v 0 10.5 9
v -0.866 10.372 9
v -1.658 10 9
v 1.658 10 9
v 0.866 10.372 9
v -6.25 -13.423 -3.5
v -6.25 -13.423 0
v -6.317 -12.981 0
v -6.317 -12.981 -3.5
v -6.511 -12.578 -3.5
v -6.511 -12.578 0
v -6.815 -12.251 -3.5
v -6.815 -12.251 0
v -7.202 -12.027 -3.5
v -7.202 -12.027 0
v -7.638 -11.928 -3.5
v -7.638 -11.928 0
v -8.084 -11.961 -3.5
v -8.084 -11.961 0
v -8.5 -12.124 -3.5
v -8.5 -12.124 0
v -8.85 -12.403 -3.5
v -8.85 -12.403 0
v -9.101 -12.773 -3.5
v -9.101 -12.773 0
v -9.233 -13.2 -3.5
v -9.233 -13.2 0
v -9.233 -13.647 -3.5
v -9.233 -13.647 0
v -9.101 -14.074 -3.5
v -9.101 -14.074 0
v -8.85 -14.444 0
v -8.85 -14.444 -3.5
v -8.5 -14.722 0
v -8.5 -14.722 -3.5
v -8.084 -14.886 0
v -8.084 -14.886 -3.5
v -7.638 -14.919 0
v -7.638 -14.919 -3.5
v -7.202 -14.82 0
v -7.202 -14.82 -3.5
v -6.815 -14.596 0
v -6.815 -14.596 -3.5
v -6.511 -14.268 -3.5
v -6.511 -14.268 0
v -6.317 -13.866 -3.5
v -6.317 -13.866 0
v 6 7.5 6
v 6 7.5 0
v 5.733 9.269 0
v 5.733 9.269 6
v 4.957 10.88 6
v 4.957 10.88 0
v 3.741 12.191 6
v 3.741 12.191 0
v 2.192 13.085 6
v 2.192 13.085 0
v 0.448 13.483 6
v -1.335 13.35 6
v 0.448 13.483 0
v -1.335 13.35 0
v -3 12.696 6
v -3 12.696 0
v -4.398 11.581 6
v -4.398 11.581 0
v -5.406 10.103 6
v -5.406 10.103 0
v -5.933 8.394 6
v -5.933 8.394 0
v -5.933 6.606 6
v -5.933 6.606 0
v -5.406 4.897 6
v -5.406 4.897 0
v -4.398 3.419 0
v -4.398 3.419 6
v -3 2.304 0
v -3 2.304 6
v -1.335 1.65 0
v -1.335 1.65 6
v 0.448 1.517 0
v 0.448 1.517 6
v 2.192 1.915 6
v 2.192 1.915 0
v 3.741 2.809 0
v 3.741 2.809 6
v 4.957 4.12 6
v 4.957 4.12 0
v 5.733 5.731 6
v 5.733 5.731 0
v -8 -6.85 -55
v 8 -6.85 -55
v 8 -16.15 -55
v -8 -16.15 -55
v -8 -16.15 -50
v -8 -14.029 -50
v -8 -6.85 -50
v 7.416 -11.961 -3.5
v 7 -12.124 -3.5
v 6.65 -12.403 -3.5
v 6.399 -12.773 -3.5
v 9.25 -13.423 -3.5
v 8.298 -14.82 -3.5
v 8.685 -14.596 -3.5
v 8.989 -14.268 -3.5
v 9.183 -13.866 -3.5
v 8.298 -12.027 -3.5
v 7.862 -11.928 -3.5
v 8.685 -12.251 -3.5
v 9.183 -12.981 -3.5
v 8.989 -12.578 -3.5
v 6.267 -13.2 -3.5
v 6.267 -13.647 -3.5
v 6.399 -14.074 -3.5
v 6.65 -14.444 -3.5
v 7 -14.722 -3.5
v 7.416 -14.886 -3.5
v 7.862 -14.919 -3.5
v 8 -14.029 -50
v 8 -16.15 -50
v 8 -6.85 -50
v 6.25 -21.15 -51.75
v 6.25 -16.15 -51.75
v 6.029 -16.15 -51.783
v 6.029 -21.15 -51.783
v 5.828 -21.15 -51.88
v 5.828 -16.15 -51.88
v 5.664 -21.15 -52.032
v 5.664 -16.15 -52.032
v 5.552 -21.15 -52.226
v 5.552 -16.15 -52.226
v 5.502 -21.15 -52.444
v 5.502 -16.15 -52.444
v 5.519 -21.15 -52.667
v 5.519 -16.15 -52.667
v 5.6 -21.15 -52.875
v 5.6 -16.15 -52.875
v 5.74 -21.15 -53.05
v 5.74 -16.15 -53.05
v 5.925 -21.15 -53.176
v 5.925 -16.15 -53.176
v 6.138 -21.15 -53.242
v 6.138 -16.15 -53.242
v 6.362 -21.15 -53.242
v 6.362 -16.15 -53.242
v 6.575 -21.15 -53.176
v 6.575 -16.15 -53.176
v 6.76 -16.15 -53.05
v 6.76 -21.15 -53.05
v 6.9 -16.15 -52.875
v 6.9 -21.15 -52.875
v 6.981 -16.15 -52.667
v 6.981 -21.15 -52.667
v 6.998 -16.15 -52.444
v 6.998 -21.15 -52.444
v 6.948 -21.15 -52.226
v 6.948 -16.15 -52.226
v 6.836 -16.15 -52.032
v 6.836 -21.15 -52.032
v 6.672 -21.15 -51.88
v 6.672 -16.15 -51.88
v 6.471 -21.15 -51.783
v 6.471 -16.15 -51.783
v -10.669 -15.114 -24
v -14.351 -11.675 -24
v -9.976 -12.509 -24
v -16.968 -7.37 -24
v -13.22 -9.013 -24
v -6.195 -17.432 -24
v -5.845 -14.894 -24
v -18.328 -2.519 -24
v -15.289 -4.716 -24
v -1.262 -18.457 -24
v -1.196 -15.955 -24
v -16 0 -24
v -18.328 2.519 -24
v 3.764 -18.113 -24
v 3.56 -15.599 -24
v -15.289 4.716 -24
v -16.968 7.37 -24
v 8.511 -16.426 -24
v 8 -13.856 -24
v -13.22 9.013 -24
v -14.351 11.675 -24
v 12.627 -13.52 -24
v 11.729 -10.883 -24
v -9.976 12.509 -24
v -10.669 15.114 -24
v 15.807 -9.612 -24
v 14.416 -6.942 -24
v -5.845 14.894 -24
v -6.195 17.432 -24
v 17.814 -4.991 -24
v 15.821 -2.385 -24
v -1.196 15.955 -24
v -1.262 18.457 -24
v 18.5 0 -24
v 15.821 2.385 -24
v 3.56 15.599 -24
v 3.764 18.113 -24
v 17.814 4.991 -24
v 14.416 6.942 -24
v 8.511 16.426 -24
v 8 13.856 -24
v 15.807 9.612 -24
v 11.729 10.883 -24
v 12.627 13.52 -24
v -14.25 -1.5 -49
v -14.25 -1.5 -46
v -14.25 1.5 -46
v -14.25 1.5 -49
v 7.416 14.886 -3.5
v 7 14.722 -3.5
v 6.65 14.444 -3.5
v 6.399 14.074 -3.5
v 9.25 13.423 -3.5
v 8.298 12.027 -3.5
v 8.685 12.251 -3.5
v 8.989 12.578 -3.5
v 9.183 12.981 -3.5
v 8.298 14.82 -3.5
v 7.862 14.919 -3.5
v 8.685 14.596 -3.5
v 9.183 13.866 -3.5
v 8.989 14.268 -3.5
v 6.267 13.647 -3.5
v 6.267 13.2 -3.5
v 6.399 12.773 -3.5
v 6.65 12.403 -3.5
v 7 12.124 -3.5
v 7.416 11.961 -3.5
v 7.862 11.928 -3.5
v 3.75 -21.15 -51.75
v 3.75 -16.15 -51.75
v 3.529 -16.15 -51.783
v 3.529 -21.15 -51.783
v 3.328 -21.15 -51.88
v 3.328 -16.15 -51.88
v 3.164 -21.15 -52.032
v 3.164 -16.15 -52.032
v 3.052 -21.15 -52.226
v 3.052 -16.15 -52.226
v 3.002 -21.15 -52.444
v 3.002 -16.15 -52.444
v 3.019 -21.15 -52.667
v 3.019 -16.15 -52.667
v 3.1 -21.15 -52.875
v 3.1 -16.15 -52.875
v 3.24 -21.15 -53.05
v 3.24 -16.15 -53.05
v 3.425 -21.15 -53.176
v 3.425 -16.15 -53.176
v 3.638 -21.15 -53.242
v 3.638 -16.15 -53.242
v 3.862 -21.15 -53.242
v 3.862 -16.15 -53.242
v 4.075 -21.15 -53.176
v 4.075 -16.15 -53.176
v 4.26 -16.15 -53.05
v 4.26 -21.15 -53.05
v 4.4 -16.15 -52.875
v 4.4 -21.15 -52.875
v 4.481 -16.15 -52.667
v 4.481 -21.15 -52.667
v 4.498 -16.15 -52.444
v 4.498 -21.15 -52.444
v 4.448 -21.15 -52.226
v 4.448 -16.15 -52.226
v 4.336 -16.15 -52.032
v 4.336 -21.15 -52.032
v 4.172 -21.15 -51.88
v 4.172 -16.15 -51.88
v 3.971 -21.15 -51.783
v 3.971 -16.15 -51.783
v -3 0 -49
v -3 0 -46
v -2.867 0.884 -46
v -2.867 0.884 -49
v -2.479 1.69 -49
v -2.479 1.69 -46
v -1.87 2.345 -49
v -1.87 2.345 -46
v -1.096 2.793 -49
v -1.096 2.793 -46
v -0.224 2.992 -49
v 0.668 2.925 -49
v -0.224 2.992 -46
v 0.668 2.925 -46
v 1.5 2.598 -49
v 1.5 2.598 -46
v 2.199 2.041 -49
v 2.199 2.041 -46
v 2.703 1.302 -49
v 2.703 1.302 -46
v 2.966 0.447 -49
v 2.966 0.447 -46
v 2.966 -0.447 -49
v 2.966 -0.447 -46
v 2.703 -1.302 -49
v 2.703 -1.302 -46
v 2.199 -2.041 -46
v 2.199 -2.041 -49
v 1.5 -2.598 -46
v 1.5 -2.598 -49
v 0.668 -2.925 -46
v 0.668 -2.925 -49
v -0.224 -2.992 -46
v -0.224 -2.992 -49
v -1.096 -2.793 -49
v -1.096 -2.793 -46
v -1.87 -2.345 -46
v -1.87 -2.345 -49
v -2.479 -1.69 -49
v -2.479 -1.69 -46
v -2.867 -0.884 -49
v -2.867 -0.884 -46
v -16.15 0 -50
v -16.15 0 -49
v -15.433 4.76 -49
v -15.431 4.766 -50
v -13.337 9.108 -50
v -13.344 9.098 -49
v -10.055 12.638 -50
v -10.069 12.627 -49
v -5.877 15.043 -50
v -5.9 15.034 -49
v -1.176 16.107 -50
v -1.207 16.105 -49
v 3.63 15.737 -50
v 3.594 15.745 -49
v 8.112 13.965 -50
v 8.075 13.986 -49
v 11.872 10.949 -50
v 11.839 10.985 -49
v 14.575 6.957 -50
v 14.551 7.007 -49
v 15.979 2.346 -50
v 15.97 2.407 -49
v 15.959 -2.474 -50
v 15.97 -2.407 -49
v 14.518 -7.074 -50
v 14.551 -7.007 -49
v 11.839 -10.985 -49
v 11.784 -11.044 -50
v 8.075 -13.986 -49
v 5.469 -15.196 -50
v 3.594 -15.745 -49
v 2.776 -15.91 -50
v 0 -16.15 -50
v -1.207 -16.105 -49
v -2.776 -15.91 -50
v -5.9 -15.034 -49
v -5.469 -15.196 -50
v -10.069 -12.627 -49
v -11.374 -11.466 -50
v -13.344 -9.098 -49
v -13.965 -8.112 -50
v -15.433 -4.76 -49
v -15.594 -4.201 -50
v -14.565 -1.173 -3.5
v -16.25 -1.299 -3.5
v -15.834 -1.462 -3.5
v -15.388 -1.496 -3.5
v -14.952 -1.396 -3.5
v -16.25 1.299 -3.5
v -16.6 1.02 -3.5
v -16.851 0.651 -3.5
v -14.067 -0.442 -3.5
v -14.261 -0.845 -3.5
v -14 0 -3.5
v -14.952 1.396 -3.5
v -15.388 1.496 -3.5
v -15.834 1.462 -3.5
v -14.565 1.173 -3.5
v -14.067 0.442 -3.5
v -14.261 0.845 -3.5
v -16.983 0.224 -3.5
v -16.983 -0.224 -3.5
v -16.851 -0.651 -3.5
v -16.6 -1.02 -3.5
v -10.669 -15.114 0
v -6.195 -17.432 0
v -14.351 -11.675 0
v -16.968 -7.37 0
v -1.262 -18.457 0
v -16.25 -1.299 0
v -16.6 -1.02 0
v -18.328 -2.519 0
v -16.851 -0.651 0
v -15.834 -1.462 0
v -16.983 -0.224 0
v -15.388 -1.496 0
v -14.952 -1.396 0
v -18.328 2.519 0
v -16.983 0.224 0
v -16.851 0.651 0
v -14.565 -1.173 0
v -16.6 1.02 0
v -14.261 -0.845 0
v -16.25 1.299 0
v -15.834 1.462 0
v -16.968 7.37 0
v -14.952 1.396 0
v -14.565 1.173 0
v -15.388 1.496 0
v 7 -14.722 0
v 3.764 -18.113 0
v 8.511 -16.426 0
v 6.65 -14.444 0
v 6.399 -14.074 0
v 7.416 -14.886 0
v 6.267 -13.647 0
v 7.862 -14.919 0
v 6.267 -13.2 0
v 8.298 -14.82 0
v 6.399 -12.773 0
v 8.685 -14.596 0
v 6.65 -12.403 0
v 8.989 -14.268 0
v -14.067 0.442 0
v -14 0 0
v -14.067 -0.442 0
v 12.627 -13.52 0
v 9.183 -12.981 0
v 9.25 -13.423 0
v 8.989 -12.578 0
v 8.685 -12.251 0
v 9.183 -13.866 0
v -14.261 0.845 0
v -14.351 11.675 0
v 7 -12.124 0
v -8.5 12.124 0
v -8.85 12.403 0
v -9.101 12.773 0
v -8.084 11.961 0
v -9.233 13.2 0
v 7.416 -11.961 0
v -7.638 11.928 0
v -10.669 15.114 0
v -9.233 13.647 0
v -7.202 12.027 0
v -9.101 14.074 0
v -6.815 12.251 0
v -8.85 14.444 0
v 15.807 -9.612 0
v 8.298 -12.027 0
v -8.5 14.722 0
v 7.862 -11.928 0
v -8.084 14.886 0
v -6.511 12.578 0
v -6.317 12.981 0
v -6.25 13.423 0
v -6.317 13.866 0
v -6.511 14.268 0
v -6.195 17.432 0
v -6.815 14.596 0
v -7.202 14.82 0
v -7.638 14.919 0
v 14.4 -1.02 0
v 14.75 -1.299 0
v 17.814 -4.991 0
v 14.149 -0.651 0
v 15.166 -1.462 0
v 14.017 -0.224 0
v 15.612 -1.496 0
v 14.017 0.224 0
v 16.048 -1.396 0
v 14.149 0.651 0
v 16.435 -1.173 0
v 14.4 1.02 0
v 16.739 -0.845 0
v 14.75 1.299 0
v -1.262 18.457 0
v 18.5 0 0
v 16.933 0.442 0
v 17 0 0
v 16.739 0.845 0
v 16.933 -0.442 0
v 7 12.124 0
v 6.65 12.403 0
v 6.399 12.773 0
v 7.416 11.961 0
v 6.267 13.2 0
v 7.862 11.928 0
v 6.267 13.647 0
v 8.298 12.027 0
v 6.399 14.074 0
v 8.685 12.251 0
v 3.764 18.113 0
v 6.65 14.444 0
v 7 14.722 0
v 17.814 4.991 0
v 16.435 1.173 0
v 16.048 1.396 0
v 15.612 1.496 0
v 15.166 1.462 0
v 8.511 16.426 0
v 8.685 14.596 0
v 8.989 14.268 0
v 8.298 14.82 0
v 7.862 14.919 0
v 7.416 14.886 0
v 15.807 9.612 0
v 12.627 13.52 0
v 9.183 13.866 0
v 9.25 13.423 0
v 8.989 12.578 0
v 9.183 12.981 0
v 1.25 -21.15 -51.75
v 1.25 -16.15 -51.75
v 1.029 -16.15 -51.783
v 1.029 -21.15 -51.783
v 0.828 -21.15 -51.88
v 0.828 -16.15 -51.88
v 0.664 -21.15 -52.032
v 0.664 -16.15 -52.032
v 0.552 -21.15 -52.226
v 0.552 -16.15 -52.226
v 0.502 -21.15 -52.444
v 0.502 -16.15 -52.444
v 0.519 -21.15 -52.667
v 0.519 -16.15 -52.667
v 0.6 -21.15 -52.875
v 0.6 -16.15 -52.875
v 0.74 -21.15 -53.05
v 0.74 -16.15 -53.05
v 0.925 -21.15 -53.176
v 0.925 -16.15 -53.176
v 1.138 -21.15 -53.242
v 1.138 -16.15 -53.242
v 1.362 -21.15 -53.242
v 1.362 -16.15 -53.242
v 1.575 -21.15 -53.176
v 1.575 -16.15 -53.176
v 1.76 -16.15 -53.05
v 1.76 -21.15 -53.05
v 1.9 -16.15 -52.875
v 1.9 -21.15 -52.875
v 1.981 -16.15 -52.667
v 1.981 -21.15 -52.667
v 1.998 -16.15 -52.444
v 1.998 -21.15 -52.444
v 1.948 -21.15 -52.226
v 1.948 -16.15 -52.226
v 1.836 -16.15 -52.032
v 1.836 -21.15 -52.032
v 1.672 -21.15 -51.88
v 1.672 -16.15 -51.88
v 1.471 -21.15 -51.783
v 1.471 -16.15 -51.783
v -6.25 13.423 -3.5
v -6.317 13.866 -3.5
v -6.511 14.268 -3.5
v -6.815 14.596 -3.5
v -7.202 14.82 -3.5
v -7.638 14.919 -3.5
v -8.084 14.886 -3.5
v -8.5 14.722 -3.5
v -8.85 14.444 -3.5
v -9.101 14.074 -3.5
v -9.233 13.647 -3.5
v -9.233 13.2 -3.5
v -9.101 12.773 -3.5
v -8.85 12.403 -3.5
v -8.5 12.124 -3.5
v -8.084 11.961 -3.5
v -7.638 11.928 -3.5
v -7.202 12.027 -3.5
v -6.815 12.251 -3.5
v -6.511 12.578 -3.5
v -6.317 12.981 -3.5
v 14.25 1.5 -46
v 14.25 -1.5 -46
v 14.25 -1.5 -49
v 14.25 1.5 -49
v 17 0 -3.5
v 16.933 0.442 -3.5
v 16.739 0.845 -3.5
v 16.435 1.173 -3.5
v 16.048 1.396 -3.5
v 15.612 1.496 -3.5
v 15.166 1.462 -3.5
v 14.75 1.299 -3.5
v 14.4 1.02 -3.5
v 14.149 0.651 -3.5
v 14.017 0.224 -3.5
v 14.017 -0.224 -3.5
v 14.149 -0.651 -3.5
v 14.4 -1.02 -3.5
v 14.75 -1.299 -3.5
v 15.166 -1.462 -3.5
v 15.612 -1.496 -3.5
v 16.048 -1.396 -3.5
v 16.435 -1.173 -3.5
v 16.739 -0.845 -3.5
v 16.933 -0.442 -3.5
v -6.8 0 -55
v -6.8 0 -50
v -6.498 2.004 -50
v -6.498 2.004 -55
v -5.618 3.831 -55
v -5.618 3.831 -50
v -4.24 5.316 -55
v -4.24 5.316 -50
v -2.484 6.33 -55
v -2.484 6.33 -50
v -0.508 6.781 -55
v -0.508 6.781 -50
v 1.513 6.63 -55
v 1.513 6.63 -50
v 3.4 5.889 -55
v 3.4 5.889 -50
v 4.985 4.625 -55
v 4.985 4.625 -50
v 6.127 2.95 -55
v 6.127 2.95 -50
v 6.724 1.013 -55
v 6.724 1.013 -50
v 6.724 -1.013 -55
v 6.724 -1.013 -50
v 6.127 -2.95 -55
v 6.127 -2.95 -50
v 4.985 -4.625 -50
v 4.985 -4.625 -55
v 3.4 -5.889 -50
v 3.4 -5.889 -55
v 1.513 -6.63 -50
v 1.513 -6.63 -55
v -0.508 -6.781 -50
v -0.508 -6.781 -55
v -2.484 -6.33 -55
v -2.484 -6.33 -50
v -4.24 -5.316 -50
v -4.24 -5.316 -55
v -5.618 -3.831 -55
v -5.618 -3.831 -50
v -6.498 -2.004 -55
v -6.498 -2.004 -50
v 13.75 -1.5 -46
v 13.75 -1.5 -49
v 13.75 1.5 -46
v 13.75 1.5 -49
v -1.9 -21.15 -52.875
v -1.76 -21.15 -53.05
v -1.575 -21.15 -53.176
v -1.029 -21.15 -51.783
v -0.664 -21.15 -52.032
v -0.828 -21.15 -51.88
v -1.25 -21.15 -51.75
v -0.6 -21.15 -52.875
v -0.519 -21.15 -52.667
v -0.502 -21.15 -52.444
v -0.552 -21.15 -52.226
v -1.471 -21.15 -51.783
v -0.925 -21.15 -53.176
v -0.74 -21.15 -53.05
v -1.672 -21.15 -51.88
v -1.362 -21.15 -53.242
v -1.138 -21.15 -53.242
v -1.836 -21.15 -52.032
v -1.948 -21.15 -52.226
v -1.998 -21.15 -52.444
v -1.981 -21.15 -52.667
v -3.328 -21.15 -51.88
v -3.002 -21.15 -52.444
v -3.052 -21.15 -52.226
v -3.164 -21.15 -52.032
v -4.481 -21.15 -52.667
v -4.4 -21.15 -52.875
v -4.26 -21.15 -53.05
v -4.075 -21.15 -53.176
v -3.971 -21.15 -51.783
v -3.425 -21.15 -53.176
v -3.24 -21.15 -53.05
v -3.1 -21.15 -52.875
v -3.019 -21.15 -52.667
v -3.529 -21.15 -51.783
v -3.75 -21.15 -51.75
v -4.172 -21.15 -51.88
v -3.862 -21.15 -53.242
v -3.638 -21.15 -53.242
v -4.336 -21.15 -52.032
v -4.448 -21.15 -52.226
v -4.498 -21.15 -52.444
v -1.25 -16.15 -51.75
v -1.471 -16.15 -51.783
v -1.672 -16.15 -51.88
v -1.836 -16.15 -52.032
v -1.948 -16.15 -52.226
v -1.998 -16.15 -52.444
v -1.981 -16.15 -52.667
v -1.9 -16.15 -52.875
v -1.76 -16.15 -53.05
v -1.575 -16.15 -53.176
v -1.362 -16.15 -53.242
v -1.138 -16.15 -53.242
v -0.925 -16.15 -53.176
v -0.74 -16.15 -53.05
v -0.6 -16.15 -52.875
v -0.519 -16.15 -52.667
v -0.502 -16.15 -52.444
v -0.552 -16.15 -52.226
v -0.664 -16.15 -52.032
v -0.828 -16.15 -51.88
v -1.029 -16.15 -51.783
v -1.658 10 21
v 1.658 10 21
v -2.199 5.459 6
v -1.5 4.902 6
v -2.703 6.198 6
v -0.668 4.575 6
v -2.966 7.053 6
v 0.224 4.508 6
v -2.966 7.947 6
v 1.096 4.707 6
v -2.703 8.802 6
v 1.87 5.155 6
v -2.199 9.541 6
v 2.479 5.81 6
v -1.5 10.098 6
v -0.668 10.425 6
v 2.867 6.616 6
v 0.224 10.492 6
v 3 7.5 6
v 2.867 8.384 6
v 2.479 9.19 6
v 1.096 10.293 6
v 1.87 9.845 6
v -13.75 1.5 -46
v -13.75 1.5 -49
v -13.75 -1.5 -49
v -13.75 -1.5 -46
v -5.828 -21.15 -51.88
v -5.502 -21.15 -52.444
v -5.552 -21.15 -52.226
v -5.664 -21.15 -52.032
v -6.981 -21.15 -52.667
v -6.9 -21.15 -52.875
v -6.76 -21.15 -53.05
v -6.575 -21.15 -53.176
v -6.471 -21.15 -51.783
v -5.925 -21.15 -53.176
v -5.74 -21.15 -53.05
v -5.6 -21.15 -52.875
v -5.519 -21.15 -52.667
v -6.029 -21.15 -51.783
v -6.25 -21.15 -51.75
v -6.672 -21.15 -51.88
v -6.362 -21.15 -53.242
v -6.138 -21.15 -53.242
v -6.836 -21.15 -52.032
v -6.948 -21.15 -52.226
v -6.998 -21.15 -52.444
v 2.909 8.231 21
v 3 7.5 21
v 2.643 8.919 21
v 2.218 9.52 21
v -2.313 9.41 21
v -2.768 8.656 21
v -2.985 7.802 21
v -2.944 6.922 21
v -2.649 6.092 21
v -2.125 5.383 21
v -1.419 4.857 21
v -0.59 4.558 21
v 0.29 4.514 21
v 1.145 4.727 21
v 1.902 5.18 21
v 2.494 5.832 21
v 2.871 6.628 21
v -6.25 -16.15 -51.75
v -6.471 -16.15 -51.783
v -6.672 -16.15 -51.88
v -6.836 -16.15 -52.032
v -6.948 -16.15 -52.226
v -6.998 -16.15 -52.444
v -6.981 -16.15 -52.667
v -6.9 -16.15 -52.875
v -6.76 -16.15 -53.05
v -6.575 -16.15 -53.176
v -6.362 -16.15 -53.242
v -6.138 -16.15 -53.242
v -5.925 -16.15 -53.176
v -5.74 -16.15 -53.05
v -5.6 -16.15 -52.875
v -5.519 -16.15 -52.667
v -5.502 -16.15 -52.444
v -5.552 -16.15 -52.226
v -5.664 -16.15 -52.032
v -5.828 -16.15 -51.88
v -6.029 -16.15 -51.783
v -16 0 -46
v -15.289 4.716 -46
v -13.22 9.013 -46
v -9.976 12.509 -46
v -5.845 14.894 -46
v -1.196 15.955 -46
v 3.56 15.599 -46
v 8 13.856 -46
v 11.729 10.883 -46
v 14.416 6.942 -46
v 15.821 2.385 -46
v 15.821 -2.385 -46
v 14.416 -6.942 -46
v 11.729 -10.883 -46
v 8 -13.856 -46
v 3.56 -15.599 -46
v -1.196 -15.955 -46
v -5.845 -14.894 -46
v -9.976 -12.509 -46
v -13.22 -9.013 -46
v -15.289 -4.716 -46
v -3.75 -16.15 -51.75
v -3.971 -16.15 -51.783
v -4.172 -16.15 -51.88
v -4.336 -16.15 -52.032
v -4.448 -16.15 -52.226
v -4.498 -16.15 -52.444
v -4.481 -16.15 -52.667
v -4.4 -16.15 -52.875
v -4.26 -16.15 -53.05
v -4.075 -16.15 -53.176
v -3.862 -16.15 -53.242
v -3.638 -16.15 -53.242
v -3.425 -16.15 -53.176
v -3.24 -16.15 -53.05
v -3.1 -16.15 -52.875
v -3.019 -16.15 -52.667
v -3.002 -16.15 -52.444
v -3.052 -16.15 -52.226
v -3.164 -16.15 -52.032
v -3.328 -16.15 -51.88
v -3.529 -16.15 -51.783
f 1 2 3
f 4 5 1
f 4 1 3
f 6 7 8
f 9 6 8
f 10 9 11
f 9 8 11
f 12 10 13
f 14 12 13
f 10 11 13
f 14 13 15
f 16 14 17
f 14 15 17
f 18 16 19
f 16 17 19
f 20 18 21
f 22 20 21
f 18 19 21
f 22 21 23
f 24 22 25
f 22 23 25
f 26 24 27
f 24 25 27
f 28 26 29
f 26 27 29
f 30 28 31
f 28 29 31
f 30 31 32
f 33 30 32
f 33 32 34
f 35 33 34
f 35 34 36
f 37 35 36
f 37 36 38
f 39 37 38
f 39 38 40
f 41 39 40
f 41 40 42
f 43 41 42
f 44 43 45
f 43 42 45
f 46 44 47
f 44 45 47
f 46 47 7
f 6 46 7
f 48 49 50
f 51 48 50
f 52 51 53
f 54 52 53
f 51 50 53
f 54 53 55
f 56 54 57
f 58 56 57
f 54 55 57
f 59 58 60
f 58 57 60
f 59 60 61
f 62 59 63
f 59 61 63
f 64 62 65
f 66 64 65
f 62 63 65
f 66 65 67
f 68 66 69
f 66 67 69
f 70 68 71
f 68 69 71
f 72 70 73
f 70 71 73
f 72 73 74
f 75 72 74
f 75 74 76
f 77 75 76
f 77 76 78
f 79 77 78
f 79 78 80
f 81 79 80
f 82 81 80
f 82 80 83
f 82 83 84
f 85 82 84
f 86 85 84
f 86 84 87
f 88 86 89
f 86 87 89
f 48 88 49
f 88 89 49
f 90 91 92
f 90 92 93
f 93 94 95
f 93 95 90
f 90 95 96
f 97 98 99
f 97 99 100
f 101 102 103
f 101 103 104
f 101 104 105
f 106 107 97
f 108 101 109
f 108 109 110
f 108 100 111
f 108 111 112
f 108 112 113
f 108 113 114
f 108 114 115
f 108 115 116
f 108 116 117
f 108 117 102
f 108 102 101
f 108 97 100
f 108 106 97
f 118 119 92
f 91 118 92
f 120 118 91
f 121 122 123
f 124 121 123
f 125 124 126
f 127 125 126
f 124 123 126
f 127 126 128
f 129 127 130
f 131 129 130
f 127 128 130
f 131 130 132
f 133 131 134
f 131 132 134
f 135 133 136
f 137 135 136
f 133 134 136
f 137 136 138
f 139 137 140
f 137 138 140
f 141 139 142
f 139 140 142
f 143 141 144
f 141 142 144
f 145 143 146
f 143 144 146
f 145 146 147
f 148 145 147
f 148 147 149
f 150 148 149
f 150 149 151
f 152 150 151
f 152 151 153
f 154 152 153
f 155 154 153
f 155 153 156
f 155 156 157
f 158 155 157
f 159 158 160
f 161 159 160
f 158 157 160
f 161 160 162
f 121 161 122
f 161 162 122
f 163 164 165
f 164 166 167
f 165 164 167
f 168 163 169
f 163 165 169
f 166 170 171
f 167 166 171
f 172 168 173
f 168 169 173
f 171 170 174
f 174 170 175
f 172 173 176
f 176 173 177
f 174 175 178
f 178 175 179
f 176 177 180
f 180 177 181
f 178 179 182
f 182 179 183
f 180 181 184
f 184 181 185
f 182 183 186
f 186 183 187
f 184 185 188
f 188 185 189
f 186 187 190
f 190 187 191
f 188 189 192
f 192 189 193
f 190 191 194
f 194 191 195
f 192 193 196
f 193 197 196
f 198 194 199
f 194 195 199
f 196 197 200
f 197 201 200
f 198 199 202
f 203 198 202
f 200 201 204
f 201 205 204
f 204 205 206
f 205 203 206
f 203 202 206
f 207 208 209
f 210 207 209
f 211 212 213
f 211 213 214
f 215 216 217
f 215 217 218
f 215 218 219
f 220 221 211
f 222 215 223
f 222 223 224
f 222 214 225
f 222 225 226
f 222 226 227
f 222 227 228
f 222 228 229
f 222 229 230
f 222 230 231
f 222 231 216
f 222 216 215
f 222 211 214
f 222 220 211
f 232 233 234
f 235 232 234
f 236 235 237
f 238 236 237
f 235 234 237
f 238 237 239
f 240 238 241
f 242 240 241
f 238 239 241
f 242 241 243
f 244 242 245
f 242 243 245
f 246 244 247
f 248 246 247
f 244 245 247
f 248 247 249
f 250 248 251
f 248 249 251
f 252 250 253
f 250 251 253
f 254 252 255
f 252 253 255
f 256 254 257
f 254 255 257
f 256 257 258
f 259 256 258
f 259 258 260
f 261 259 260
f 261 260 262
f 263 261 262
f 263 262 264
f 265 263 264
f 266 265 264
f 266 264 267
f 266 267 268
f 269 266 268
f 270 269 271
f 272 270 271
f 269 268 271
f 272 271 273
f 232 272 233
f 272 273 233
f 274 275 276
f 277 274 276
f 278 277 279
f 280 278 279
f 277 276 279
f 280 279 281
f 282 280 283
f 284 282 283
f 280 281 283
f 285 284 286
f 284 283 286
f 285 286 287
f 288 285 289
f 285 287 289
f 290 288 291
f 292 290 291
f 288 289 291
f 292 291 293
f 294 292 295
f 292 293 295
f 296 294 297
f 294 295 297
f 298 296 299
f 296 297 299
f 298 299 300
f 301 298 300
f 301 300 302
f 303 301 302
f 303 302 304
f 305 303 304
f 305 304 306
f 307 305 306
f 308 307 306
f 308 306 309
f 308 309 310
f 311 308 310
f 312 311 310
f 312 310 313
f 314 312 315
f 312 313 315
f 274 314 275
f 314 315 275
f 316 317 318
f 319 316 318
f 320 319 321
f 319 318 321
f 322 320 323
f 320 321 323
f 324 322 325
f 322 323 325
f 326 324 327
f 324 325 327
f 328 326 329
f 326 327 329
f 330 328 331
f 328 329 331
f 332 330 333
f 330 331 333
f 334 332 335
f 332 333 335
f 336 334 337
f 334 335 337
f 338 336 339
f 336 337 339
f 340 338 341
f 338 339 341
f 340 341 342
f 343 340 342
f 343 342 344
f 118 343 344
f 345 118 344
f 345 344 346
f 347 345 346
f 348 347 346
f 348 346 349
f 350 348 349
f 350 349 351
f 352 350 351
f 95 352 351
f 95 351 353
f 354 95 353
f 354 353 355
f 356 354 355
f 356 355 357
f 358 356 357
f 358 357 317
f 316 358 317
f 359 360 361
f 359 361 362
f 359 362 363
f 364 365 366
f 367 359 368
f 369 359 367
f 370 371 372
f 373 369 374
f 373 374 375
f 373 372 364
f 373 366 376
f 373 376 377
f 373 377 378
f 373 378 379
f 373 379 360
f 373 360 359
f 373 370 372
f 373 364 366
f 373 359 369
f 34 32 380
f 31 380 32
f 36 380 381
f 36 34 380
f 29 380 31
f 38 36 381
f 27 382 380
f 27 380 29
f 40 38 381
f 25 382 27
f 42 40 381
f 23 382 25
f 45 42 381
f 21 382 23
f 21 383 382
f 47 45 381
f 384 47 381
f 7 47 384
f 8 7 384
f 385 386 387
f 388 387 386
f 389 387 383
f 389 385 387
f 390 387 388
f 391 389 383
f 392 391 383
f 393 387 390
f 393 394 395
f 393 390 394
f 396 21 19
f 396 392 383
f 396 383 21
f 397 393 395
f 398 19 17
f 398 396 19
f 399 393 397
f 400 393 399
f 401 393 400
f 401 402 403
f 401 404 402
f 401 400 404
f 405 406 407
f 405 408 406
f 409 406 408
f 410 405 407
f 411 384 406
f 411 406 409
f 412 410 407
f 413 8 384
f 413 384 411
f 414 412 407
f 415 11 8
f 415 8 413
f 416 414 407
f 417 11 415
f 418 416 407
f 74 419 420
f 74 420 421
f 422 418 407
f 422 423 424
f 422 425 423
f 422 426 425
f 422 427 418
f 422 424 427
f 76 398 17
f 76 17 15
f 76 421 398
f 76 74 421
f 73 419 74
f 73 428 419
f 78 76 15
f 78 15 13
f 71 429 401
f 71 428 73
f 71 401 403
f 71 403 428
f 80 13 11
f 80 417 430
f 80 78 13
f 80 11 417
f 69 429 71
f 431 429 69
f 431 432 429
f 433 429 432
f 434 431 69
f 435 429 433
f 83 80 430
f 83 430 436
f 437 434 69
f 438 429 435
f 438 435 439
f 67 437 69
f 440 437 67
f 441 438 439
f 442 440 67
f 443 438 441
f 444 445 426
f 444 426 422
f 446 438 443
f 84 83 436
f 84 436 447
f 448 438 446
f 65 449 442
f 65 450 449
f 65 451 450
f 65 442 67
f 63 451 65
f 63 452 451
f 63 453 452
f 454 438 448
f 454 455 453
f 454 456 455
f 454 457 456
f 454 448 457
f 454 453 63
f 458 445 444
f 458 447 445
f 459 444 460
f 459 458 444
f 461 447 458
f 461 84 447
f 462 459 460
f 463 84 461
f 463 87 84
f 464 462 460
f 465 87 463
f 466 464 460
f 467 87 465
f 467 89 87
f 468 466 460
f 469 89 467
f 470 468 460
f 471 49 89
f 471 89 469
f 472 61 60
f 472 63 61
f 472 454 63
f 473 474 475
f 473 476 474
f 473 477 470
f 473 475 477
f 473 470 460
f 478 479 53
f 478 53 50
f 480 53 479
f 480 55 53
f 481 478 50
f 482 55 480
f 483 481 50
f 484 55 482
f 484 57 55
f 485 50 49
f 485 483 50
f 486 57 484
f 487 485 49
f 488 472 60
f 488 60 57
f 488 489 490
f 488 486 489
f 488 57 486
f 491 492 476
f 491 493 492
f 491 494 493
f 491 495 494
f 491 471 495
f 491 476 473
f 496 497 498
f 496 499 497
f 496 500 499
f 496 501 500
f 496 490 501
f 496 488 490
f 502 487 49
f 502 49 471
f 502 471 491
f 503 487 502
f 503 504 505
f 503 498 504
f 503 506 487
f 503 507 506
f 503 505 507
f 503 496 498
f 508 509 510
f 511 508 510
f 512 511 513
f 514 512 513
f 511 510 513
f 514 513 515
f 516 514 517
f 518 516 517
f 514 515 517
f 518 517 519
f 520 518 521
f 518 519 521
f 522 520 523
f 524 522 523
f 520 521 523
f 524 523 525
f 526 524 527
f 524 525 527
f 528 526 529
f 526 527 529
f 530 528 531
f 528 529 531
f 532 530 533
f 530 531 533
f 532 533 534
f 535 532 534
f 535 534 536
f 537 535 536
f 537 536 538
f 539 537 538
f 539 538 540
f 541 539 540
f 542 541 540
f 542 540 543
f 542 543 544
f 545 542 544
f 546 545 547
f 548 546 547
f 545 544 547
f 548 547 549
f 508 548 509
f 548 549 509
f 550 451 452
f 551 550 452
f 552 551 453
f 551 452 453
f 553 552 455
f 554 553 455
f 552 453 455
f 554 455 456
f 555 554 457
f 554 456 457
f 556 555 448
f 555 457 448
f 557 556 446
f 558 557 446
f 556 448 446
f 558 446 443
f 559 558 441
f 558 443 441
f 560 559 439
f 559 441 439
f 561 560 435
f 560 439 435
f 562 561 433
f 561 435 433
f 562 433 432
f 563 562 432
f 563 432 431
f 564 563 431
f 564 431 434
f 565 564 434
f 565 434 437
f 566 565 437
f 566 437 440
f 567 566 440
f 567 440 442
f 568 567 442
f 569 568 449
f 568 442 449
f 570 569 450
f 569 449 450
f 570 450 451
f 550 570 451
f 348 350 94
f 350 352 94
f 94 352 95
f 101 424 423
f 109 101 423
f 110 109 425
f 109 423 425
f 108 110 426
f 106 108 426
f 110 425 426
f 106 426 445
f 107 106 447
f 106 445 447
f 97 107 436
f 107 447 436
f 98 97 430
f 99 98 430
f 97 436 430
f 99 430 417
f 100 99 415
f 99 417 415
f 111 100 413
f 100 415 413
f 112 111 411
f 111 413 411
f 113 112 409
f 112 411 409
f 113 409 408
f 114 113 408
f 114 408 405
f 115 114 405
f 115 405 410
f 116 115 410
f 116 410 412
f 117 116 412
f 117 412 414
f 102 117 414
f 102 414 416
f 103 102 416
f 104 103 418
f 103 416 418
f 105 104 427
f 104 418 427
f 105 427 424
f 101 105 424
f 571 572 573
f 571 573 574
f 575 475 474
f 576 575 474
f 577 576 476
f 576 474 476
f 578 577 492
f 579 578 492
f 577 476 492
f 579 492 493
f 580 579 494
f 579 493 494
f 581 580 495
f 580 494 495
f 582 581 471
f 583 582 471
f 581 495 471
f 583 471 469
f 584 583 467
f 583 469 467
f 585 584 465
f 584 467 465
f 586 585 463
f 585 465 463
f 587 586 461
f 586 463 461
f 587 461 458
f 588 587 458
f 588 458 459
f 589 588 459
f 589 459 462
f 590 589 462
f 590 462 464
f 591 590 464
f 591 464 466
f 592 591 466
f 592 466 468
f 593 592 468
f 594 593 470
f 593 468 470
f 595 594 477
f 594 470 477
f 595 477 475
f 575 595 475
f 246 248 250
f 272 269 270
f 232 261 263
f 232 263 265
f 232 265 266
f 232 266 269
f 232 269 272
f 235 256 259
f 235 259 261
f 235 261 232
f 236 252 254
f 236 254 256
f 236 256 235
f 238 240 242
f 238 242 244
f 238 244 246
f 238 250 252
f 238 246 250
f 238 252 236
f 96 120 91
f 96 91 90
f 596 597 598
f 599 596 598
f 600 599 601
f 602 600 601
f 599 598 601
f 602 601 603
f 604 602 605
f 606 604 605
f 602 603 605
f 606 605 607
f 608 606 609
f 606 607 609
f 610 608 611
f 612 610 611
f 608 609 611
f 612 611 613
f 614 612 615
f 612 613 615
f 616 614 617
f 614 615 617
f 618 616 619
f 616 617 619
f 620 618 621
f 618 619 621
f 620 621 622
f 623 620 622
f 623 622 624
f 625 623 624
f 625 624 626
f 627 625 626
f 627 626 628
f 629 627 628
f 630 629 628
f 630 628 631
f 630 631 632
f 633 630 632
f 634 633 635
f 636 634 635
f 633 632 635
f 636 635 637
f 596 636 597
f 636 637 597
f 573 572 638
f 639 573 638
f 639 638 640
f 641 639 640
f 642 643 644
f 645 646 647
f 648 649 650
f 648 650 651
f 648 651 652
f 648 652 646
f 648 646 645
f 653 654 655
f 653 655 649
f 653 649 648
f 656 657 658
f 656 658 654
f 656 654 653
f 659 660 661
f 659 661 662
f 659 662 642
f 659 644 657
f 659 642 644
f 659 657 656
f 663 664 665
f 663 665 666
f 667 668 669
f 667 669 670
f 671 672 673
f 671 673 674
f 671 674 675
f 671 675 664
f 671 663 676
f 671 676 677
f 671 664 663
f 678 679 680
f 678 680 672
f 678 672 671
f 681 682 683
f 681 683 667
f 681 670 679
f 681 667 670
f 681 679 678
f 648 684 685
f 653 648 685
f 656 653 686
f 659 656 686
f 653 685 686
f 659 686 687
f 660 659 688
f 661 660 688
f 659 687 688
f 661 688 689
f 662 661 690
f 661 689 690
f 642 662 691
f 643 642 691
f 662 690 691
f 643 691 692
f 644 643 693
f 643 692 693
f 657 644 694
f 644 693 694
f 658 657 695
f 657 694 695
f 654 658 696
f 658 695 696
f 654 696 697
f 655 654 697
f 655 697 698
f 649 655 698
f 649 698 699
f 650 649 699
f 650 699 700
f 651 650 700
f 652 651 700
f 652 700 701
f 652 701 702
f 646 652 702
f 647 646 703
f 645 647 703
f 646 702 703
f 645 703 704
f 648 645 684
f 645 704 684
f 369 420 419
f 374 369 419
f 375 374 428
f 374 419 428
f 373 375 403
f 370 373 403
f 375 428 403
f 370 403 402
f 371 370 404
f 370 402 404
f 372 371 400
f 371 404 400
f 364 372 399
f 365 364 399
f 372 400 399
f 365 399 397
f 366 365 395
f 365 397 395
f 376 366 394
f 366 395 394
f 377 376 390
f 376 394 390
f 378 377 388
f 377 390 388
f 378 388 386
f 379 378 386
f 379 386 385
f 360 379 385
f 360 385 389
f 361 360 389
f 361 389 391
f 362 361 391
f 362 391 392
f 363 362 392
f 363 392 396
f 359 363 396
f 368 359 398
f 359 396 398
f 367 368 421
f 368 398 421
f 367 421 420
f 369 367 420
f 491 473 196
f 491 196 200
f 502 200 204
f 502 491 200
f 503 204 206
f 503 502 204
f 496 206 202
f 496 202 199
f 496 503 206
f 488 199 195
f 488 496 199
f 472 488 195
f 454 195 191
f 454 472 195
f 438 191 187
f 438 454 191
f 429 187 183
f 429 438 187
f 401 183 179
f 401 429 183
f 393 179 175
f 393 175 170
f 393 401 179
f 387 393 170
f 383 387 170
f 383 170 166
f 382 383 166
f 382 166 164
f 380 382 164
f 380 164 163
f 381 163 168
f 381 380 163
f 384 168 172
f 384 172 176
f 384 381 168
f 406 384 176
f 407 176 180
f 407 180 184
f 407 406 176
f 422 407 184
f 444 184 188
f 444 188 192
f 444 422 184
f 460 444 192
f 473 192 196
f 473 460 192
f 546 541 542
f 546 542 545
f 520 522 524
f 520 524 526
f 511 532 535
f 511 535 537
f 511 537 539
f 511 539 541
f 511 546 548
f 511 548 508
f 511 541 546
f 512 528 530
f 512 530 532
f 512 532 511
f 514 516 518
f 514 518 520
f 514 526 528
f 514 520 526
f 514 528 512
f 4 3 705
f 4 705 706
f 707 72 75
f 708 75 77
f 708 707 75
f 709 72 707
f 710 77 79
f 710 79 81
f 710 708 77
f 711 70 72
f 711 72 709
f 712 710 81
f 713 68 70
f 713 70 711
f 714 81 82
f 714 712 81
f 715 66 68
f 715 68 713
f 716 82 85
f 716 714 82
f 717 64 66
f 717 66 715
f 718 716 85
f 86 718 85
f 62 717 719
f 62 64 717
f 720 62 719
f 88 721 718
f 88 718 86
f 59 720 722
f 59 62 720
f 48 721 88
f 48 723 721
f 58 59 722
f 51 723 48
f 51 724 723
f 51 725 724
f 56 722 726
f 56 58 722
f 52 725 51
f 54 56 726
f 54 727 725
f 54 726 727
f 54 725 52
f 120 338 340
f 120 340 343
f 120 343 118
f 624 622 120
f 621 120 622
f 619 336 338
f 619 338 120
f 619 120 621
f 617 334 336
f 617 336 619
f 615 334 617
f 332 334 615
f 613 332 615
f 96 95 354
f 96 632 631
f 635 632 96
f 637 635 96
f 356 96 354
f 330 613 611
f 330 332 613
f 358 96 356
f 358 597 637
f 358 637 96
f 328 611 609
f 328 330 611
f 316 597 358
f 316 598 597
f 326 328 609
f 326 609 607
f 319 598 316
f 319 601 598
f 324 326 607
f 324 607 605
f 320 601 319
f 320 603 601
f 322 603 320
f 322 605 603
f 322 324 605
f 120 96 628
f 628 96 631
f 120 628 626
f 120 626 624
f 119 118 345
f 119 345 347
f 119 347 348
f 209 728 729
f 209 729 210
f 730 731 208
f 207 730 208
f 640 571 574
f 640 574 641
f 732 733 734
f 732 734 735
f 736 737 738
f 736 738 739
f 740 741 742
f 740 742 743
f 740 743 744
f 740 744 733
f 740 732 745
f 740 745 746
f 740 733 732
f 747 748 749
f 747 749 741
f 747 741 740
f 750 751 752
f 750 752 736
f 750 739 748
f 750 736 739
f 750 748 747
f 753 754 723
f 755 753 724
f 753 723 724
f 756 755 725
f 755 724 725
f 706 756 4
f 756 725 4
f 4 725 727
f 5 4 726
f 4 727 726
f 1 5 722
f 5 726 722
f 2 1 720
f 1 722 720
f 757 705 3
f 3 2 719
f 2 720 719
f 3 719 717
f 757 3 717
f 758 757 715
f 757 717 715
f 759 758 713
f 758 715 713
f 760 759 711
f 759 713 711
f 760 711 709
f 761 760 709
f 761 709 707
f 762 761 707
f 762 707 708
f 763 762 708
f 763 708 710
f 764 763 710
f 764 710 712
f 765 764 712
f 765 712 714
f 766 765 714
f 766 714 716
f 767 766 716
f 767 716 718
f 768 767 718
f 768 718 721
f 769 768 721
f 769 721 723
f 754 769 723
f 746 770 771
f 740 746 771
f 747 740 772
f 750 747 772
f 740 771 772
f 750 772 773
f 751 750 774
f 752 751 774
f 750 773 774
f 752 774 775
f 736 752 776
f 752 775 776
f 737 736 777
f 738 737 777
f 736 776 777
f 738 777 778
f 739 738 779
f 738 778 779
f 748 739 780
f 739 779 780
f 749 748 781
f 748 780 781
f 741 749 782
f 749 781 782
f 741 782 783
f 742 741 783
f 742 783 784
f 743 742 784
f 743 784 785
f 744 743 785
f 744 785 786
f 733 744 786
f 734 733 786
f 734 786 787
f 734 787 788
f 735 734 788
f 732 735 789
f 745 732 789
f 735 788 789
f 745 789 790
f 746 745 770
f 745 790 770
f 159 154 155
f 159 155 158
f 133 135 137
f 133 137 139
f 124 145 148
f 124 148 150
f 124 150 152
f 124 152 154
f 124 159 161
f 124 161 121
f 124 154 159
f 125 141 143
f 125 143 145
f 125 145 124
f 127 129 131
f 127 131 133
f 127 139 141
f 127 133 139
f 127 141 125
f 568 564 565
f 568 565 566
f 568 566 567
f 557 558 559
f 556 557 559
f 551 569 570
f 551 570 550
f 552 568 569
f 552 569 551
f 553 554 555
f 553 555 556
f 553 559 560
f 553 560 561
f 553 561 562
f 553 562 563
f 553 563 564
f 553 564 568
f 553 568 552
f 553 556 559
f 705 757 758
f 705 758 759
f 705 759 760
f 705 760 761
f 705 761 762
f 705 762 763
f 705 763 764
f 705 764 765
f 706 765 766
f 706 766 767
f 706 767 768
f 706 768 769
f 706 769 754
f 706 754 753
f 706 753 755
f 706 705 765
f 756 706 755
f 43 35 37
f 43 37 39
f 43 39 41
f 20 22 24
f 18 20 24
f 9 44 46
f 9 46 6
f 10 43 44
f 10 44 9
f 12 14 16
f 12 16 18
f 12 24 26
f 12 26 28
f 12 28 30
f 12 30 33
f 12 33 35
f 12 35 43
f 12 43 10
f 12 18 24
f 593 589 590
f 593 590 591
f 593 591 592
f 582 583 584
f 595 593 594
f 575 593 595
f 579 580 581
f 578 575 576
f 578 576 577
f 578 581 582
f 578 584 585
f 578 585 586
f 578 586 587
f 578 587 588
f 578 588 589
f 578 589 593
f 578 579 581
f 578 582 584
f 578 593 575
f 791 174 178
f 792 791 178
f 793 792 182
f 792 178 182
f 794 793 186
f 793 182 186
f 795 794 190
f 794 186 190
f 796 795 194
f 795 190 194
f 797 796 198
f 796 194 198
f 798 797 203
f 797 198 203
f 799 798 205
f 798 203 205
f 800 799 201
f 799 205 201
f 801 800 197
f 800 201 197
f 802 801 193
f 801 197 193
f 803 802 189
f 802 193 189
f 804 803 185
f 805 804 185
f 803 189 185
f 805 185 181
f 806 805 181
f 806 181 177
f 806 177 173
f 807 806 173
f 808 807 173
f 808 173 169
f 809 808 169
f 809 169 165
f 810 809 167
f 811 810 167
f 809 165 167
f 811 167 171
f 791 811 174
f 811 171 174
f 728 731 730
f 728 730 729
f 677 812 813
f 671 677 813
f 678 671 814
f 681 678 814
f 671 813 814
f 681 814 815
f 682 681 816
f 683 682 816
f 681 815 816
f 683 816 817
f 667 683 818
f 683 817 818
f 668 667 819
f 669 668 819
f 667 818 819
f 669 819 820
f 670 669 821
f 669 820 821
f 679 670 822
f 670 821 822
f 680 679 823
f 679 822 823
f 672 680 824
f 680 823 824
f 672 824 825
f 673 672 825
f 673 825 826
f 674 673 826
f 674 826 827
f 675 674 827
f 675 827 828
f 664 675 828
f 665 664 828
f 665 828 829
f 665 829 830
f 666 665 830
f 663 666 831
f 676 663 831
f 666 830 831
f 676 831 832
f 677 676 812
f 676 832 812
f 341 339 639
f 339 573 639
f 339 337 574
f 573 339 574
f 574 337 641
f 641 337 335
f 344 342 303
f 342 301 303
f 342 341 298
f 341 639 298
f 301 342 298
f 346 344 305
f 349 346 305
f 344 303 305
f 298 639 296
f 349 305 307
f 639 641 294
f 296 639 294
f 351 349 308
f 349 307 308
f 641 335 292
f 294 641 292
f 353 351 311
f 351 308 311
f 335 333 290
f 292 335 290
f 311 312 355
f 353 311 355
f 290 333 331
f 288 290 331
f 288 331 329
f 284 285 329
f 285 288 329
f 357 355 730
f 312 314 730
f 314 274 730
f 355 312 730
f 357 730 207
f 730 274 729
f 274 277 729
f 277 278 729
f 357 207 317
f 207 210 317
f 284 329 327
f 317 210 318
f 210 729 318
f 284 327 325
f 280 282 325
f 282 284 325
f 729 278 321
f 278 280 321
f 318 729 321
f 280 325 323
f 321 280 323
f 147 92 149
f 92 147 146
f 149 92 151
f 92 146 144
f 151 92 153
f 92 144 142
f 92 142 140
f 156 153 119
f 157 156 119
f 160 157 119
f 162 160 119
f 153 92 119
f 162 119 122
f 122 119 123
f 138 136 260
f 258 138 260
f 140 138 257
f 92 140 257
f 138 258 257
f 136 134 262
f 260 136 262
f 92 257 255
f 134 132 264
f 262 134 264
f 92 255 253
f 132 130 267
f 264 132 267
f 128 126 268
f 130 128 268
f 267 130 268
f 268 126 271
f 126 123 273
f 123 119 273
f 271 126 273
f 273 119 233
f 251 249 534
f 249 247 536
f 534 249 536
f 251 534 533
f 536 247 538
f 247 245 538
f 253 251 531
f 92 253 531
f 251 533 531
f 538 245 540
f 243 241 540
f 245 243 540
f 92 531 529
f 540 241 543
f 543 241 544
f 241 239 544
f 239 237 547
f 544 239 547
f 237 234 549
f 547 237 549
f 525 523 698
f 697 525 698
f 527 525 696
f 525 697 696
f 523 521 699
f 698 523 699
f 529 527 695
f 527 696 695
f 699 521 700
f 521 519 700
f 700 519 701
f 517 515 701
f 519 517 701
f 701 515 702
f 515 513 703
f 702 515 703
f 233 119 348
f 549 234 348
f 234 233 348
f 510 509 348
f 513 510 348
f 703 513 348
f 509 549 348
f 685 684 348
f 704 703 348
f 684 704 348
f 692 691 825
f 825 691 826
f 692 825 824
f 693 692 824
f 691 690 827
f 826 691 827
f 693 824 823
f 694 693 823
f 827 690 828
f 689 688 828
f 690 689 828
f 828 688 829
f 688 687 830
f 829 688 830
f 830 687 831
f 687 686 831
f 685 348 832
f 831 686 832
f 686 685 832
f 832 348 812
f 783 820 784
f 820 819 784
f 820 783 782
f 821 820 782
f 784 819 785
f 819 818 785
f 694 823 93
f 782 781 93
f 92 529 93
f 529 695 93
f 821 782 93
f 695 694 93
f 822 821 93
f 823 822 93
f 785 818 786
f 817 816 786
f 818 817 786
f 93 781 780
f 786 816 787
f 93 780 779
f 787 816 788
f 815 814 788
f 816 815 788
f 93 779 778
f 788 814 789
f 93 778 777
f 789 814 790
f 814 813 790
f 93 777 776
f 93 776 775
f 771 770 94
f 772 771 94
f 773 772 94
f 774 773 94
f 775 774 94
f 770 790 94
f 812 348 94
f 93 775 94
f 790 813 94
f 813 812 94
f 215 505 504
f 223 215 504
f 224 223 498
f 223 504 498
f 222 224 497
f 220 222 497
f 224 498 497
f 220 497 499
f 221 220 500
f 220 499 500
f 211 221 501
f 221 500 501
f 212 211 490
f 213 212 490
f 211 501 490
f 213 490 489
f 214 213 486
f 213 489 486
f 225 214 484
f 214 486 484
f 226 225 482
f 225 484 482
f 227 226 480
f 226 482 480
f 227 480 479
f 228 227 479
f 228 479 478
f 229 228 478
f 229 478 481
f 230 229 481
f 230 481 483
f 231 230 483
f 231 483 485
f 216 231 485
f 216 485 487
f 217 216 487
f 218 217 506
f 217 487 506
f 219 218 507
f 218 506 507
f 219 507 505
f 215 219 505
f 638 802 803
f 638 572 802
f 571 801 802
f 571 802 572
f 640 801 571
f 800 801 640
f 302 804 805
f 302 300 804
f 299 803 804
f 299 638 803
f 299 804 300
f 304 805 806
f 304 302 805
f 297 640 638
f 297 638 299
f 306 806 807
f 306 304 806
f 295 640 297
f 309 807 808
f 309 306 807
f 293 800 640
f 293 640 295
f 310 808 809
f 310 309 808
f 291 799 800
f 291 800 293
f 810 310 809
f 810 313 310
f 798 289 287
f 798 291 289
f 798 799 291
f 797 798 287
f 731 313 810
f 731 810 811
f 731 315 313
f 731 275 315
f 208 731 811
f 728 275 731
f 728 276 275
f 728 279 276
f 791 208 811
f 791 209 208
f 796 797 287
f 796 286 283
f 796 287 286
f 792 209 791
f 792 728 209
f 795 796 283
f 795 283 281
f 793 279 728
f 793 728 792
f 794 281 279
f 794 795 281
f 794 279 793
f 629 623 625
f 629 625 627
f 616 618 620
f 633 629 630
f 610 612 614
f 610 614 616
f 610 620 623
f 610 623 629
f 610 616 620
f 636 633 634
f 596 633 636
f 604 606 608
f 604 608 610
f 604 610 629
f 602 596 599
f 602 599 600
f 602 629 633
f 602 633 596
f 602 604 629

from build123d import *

# Parameters (mm, degrees)
SKETCH_2_R          = 18.5
EXTRUDE_1_DEPTH     = 24
SKETCH_3_R          = 16
EXTRUDE_2_DEPTH     = 22
SKETCH_4_R          = 3
SKETCH_4_W          = 0.5
SKETCH_4_H          = 3
EXTRUDE_3_DEPTH     = 3
SKETCH_5_R          = 16.15
EXTRUDE_4_DEPTH     = 1
SKETCH_6_R          = 6.8
SKETCH_6_W          = 16
SKETCH_6_H          = 9.3
EXTRUDE_7_DEPTH     = 5
SKETCH_7_R          = 0.75
EXTRUDE_8_DEPTH     = 5
SKETCH_8_R          = 6
EXTRUDE_9_DEPTH     = 6
SKETCH_9_R          = 3
EXTRUDE_10_DEPTH    = 15
CUT_EXTRUDE_START   = -12
CUT_EXTRUDE_1_DEPTH = 12
SKETCH_11_R         = 1.5
CUT_EXTRUDE_2_DEPTH = 3.5


with BuildPart() as part:
    # 스케치2 → 보스-돌출1 (new body)
    with BuildSketch(Plane.XY):
        Circle(SKETCH_2_R)
    extrude(amount=-EXTRUDE_1_DEPTH)

    # 스케치3 → 보스-돌출2 (add)
    with BuildSketch(Plane(origin=(0, 0, -24), x_dir=(-1, 0, 0), z_dir=(0, 0, -1))):
        Circle(SKETCH_3_R)
    extrude(amount=EXTRUDE_2_DEPTH)

    # 스케치4 → 보스-돌출3 (add)
    with BuildSketch(Plane(origin=(0, 0, -46), x_dir=(-1, 0, 0), z_dir=(0, 0, -1))):
        Circle(SKETCH_4_R)
        with Locations((14, 0)):
            Rectangle(SKETCH_4_W, SKETCH_4_H)
        with Locations((-14, 0)):
            Rectangle(SKETCH_4_W, SKETCH_4_H)
    extrude(amount=EXTRUDE_3_DEPTH)

    # 스케치5 → 보스-돌출4 (add)
    with BuildSketch(Plane(origin=(0, 0, -49), x_dir=(-1, 0, 0), z_dir=(0, 0, -1))):
        Circle(SKETCH_5_R)
    extrude(amount=EXTRUDE_4_DEPTH)

    # 스케치6 → 보스-돌출7 (add)
    with BuildSketch(Plane(origin=(0, 0, -50), x_dir=(-1, 0, 0), z_dir=(0, 0, -1))):
        Circle(SKETCH_6_R)
        with Locations((0, -11.5)):
            Rectangle(SKETCH_6_W, SKETCH_6_H)
    extrude(amount=EXTRUDE_7_DEPTH)

    # 스케치7 → 보스-돌출8 (add)
    with BuildSketch(Plane.XZ.offset(16.15)):
        with Locations(Location((-6.25, -52.5, 0), (0, 0, 90))):
            Circle(SKETCH_7_R)
        with Locations(Location((-3.75, -52.5, 0), (0, 0, 90))):
            Circle(SKETCH_7_R)
        with Locations(Location((-1.25, -52.5, 0), (0, 0, 90))):
            Circle(SKETCH_7_R)
        with Locations(Location((1.25, -52.5, 0), (0, 0, 90))):
            Circle(SKETCH_7_R)
        with Locations(Location((3.75, -52.5, 0), (0, 0, 90))):
            Circle(SKETCH_7_R)
        with Locations(Location((6.25, -52.5, 0), (0, 0, 90))):
            Circle(SKETCH_7_R)
    extrude(amount=EXTRUDE_8_DEPTH)

    # 스케치8 → 보스-돌출9 (add)
    with BuildSketch(Plane.XY):
        with Locations((0, 7.5)):
            Circle(SKETCH_8_R)
    extrude(amount=EXTRUDE_9_DEPTH)

    # 스케치9 → 보스-돌출10 (add)
    with BuildSketch(Plane.XY.offset(6)):
        with Locations((0, 7.5)):
            Circle(SKETCH_9_R)
    extrude(amount=EXTRUDE_10_DEPTH)

    # 스케치10 → 컷-돌출1 (cut)
    with BuildSketch(Plane.XY.offset(21).offset(CUT_EXTRUDE_START)):
        with BuildLine():
            Line((-1.658312395, 10), (1.658312395, 10))
            ThreePointArc((1.658312395, 10), (0, 10.5), (-1.658312395, 10))
        make_face()
    extrude(amount=CUT_EXTRUDE_1_DEPTH, mode=Mode.SUBTRACT)

    # 스케치11 → 컷-돌출2 (cut)
    with BuildSketch(Plane.XY):
        with Locations((15.5, 0)):
            Circle(SKETCH_11_R)
        with Locations((7.75, -13.423393759)):
            Circle(SKETCH_11_R)
        with Locations((-7.75, -13.423393759)):
            Circle(SKETCH_11_R)
        with Locations((-15.5, 0)):
            Circle(SKETCH_11_R)
        with Locations((-7.75, 13.423393759)):
            Circle(SKETCH_11_R)
        with Locations((7.75, 13.423393759)):
            Circle(SKETCH_11_R)
    extrude(amount=-CUT_EXTRUDE_2_DEPTH, mode=Mode.SUBTRACT)


solid = part.part
